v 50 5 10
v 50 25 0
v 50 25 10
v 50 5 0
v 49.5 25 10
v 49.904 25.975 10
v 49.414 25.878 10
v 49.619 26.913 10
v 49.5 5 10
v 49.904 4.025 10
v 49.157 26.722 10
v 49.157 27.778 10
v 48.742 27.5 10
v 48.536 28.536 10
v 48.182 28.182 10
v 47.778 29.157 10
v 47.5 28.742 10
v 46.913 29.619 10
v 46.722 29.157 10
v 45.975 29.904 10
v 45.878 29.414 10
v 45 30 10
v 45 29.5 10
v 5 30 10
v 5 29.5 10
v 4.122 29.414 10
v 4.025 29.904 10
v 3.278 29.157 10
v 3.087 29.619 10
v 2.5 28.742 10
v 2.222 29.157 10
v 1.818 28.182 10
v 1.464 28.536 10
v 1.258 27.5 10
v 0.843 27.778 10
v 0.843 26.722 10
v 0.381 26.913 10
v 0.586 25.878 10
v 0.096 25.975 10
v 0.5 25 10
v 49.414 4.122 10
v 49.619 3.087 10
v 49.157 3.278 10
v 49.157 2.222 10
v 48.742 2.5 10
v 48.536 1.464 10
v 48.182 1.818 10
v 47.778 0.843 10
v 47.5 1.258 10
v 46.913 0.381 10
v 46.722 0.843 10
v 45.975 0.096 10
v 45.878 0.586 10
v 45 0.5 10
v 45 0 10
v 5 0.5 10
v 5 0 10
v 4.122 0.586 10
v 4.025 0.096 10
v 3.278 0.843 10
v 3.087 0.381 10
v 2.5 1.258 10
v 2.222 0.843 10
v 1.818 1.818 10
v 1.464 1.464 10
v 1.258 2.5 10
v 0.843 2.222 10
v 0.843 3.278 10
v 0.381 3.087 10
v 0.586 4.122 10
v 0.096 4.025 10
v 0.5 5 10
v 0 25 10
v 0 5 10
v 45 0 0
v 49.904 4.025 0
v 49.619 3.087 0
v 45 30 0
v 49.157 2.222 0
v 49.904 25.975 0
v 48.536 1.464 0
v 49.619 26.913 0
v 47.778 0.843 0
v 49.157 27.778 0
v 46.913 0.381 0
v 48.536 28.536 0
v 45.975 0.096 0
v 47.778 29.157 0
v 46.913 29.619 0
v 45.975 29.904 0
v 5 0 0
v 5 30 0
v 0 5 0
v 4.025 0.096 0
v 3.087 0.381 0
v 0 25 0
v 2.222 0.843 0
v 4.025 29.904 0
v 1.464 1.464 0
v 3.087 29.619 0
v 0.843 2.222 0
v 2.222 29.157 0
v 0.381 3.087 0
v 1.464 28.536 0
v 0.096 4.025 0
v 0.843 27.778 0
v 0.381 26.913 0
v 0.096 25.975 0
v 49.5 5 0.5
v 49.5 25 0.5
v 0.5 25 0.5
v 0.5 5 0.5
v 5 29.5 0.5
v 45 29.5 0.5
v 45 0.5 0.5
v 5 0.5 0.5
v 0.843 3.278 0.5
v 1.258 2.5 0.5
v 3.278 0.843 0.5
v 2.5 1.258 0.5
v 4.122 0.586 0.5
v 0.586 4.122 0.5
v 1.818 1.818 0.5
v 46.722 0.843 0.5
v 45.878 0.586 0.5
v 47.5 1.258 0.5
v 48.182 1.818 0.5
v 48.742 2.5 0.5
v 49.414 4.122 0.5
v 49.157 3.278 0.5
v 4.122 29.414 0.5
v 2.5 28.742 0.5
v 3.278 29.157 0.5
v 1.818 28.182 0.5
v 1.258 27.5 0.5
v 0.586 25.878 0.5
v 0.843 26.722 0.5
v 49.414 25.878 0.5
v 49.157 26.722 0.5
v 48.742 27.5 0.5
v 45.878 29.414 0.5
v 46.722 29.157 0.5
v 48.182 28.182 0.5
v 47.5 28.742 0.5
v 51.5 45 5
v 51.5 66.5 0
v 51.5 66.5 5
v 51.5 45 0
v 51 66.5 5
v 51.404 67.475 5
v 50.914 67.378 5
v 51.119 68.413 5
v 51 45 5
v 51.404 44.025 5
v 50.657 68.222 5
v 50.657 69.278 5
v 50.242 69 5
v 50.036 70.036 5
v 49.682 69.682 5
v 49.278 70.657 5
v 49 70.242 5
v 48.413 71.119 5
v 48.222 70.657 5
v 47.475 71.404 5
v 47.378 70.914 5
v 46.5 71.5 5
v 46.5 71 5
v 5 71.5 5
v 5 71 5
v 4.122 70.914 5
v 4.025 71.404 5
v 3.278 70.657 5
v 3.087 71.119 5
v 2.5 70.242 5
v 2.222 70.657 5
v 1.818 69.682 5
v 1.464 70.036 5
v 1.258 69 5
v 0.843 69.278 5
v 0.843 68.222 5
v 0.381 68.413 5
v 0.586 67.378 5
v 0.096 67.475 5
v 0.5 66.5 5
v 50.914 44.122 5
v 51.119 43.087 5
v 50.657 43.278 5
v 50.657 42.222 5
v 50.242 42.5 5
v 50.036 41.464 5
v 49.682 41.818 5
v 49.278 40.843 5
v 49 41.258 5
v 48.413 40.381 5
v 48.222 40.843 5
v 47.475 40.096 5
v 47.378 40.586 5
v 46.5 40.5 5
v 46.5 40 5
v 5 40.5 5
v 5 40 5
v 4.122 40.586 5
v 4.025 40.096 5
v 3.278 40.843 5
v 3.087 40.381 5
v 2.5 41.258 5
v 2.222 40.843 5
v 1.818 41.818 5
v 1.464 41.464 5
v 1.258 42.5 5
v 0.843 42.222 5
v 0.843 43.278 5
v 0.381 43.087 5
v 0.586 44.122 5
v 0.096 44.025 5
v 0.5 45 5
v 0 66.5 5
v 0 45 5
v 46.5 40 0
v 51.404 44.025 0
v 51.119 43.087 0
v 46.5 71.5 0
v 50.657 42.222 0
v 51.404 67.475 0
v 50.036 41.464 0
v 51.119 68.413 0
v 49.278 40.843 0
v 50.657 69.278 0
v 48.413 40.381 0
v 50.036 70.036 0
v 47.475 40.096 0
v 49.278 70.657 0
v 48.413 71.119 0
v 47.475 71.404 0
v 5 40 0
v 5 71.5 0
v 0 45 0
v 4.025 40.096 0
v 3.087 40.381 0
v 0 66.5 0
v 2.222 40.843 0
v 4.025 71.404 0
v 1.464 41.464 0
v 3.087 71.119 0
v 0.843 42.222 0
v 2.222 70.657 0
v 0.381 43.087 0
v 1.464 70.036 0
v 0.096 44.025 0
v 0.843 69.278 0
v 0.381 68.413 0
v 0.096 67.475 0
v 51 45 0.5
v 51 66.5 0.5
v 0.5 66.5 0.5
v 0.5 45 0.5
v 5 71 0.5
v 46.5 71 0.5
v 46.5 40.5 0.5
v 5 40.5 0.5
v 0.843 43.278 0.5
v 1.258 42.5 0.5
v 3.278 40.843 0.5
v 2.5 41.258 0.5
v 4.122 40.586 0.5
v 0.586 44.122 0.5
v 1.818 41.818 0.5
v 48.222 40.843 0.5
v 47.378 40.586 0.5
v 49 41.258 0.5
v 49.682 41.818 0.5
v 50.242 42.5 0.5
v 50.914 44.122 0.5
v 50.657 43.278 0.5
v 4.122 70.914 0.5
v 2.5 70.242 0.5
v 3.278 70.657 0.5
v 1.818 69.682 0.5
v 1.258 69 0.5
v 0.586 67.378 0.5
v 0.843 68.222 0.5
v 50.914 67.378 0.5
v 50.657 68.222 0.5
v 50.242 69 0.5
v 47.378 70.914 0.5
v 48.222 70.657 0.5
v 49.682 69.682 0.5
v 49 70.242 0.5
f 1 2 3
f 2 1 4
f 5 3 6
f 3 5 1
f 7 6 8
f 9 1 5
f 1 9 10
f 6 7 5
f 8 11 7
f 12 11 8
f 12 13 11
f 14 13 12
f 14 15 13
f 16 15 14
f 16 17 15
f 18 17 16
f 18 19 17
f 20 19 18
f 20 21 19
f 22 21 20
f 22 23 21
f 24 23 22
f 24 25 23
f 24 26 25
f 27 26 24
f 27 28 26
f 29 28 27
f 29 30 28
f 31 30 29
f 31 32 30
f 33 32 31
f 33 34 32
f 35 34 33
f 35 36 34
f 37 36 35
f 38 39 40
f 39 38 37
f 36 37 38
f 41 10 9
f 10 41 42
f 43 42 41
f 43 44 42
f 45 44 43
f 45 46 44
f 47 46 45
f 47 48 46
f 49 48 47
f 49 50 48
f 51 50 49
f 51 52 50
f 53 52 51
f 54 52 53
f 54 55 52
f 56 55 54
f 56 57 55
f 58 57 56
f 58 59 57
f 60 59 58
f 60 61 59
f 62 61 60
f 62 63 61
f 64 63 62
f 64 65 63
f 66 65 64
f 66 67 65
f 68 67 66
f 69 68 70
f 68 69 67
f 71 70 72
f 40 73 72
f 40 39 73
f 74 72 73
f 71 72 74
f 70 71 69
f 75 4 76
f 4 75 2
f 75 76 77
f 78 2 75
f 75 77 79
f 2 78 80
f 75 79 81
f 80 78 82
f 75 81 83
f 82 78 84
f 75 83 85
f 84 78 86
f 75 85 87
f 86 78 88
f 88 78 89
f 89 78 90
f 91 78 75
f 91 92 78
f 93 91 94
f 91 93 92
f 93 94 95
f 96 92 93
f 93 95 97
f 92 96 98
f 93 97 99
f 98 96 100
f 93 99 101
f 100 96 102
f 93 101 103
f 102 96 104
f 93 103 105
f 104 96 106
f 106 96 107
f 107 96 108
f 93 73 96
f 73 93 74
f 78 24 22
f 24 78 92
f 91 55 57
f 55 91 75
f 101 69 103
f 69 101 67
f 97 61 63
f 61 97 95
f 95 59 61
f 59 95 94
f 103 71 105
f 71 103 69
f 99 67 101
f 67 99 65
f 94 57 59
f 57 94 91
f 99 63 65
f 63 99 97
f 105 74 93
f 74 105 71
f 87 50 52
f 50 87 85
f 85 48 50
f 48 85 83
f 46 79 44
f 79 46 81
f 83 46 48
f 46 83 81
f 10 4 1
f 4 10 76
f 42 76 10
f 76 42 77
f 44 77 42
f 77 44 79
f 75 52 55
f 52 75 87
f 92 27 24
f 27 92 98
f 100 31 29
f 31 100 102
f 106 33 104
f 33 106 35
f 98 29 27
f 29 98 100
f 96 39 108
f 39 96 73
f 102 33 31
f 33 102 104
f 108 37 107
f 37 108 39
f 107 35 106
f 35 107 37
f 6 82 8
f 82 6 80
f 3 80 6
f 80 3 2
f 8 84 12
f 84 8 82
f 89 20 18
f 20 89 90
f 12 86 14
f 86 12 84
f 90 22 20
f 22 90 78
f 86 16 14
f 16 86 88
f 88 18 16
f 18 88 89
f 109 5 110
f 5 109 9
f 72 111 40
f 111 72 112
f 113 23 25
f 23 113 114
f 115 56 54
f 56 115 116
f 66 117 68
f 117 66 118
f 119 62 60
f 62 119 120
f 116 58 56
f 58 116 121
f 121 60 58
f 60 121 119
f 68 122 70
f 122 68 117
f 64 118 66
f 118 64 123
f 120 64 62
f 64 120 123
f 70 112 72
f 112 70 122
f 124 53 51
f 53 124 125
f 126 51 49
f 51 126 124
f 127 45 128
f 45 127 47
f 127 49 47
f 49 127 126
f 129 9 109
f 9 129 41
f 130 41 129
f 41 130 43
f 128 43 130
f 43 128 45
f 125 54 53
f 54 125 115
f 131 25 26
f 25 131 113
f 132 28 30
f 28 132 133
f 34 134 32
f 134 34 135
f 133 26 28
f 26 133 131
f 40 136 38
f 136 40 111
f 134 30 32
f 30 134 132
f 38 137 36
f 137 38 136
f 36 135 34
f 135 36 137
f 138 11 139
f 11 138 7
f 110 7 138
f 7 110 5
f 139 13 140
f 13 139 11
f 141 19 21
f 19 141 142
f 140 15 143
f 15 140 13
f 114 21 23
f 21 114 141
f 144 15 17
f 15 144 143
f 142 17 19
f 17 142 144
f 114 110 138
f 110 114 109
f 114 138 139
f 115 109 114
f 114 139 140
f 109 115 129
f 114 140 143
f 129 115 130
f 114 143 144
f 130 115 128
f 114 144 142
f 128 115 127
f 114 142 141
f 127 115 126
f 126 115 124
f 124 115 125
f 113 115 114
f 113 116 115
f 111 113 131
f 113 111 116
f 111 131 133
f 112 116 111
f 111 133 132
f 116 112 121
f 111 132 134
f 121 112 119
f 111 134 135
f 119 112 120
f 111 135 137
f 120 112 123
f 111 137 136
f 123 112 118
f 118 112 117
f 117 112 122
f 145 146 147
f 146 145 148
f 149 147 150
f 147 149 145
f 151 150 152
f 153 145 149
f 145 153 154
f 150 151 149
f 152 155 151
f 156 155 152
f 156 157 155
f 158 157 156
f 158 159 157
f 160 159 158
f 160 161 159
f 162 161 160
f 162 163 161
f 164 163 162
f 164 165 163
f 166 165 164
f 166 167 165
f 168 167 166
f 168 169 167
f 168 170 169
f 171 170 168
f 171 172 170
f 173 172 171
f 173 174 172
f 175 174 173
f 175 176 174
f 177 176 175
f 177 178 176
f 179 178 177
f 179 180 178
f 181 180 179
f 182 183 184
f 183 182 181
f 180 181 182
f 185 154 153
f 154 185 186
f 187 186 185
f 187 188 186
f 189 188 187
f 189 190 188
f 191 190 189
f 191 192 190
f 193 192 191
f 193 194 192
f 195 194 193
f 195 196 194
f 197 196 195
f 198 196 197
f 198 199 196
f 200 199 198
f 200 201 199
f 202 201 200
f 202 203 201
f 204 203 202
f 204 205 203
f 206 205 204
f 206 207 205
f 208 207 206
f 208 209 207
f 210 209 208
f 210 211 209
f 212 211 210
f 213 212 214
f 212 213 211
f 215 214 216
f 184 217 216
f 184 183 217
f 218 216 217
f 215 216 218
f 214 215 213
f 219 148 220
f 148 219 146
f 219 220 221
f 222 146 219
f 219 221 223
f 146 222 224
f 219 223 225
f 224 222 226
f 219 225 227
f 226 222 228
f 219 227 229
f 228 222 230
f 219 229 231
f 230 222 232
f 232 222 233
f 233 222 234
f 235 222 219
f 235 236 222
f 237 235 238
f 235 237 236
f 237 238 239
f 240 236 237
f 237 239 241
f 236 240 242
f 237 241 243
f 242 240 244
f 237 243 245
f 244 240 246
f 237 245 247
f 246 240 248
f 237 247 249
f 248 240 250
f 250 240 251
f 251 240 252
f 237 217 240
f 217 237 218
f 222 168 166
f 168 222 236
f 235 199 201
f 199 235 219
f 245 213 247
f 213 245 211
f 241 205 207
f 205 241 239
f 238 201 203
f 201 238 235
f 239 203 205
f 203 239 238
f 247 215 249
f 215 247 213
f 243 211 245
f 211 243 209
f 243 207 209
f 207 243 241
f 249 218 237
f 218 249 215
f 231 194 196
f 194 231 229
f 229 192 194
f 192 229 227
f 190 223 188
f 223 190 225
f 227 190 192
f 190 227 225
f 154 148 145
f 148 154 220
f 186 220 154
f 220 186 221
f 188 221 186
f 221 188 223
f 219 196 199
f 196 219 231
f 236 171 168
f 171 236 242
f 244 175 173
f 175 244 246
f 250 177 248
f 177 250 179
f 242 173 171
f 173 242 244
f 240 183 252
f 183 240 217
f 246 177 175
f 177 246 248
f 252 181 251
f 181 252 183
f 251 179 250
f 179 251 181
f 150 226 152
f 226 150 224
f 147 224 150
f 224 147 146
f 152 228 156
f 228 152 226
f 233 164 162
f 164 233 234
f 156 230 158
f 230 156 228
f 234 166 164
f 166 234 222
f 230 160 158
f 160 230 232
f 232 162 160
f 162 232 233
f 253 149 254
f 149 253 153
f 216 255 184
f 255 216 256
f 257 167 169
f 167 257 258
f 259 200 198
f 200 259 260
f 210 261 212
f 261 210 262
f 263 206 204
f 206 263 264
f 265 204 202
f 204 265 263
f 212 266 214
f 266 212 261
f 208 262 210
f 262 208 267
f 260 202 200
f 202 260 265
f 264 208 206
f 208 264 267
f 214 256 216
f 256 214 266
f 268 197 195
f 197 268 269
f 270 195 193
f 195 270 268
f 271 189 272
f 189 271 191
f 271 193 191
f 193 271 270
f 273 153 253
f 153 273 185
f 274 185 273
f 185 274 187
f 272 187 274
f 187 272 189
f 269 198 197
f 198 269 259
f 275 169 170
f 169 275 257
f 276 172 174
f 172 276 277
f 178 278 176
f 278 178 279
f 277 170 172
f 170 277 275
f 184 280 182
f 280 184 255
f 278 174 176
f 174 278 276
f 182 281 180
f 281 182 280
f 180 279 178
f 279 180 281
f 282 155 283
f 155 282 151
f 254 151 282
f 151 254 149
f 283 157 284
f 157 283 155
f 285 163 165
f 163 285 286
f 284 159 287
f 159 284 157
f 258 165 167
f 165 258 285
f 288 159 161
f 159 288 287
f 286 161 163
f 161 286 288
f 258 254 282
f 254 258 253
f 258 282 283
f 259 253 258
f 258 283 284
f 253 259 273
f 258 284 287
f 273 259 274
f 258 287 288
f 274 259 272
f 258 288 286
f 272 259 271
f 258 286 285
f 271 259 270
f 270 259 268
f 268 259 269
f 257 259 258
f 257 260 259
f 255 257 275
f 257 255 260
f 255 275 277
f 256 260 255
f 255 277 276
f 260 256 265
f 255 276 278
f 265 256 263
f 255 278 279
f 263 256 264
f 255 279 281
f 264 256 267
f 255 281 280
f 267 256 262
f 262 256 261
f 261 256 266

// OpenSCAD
// [FL_INDEX: keywords="openscad, 3d_parametric, Parametric_rounded_corner_box, csg_solid" | COT="Parametric OpenSCAD design from 3DCodeverse"]
// Title: Parametric rounded corner box

//outer size (x)
size_x=50;

//outer size (x)
size_y=30;


//wall thickness
size_z=0.5;

//radius or the rounded corners
corner_radius=5;

//total number of faces for all corners
corner_faces=32;

spacing=size_z+1;
size_x_2=size_x+spacing;
size_y_2=size_y+spacing;

//height of the box
rim_height=10;

rim_height_2=rim_height/2;

module plate (sizeX, sizeY, sizeZ, cornerRadius, cornerFaces)
{
	union()
	{
		difference()
		{
			cube([sizeX,sizeY,sizeZ]);		
			cube([cornerRadius,cornerRadius,	sizeZ+1]);
			translate([sizeX-cornerRadius,0,0]) cube([cornerRadius,cornerRadius,sizeZ+1]);
			translate([0,sizeY-cornerRadius,0]) cube([cornerRadius,cornerRadius,sizeZ+1]);
			translate([sizeX-cornerRadius,sizeY-cornerRadius,0]) cube([cornerRadius,cornerRadius,sizeZ+1]);
		}
		translate([cornerRadius,cornerRadius,0]) cylinder(r=cornerRadius,h=sizeZ, $fn=cornerFaces);
		translate([sizeX-cornerRadius,cornerRadius,0]) cylinder(r=cornerRadius,h=sizeZ, $fn=cornerFaces);
		translate([cornerRadius,sizeY-cornerRadius,0]) cylinder(r=cornerRadius,h=sizeZ, $fn=cornerFaces);
		translate([sizeX-cornerRadius,sizeY-cornerRadius,0]) cylinder(r=cornerRadius,h=sizeZ, $fn=cornerFaces);
	}
}


//Generate box
union()
{
	difference()
	{
		plate (size_x, size_y,rim_height, corner_radius, corner_faces);
		translate([size_z,size_z,0])
		plate (size_x-(2*size_z), size_y-(2*size_z),rim_height, corner_radius-size_z, corner_faces);
	}
	plate (size_x, size_y, size_z, corner_radius, corner_faces);
}

//Generate lid
translate([0,size_y+10,0])

//assembled view
//translate([size_x+(spacing/2),-(spacing/2),rim_height+size_z])
//rotate([0,180,0])


#union()
{
	difference()
	{
		plate (size_x_2, size_y_2,rim_height_2, corner_radius, corner_faces);
		translate([size_z,size_z,0])
		plate (size_x_2-(2*size_z), size_y_2-(2*size_z),rim_height_2, corner_radius-size_z, corner_faces);
	}
	plate (size_x_2, size_y_2, size_z, corner_radius, corner_faces);
}
